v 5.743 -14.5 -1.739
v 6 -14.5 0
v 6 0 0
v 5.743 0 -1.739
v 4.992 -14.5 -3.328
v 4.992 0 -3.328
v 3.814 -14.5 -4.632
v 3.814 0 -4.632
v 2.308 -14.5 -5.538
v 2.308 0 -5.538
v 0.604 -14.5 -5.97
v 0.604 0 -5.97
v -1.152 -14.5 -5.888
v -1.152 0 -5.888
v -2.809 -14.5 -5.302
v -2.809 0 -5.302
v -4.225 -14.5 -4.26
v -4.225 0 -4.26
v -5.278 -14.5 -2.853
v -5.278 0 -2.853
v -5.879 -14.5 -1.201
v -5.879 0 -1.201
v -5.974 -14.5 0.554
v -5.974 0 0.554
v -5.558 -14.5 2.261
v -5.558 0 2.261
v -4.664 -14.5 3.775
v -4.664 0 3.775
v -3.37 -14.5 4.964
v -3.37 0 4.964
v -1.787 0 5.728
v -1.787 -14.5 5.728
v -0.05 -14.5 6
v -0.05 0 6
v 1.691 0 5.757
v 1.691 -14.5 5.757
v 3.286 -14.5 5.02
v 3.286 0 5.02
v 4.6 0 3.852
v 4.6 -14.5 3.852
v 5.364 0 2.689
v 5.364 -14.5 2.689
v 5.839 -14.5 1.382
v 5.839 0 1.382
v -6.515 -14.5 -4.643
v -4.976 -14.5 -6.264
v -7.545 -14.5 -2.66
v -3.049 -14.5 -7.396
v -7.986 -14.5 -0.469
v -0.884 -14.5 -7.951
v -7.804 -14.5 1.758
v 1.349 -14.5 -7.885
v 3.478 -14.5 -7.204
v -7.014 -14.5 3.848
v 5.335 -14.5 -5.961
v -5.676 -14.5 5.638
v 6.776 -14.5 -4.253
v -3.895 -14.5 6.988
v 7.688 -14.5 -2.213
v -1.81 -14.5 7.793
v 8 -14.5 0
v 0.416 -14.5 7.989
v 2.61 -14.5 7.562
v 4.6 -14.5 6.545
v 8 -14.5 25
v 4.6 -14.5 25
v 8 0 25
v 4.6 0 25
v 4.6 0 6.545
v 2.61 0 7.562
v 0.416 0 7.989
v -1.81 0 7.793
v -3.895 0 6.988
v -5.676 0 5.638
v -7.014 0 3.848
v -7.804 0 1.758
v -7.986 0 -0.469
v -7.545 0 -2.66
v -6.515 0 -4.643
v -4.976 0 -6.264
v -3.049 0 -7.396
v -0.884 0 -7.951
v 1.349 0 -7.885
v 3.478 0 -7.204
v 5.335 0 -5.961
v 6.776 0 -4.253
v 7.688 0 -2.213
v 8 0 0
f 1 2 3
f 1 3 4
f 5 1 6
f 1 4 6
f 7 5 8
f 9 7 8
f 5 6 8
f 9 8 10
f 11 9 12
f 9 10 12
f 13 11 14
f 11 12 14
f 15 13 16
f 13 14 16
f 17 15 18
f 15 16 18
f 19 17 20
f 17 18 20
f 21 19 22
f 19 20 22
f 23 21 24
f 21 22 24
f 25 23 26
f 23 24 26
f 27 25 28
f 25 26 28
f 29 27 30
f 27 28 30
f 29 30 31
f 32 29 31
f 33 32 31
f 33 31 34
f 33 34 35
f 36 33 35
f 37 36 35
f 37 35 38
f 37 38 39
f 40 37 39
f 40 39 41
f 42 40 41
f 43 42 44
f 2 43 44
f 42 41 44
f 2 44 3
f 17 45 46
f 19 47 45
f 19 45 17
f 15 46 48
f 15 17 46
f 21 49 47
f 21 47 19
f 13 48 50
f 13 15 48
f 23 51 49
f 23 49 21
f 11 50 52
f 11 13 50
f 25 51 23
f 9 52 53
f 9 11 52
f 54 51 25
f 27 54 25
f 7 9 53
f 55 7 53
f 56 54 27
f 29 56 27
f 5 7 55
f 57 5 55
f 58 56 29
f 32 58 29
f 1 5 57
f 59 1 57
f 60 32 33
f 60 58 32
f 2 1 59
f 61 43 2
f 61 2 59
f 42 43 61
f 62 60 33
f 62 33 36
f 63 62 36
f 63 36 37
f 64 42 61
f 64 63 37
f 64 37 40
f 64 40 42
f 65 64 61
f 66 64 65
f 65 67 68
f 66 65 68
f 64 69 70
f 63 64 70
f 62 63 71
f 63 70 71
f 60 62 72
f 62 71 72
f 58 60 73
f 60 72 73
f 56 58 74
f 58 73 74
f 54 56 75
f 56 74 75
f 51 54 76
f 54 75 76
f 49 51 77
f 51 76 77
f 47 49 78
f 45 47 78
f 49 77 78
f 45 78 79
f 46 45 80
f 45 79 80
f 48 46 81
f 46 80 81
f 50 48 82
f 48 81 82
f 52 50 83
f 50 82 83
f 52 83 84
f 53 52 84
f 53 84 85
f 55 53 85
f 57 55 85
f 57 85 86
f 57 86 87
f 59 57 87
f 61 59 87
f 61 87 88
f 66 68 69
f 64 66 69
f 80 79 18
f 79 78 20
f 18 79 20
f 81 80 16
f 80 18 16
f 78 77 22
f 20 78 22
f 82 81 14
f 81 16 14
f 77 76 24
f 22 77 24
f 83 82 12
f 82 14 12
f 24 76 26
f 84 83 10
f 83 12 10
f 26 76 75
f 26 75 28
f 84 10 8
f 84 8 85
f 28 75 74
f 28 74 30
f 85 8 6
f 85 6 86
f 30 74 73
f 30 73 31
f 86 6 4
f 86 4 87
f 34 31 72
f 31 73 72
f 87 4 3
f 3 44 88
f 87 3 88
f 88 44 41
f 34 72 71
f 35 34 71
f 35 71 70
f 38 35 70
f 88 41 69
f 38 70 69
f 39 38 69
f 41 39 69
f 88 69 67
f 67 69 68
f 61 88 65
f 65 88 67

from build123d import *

# Parameters (mm, degrees)
F1_DEPTH = 14.5


with BuildPart() as f1:
    # F0 (on Front) → F1 (new body)
    with BuildSketch(Plane.XZ):
        with BuildLine():
            ThreePointArc((8, 0), (7.099296, 3.687818), (4.6, 6.545227))
            ThreePointArc((4.6, 6.545227), (-7.099296, -3.687818), (8, 0))
        make_face()
        with BuildLine():
            ThreePointArc((4.6, 3.852272), (5.639149, 2.04939), (6, 0))
            ThreePointArc((6, 0), (-5.639149, -2.04939), (4.6, 3.852272))
        make_face(mode=Mode.SUBTRACT)
        with BuildLine():
            Line((4.6, 25), (4.6, 6.545227))
            ThreePointArc((4.6, 6.545227), (7.099296, 3.687818), (8, 0))
            Line((8, 0), (8, 25))
            Line((8, 25), (4.6, 25))
        make_face()
    extrude(amount=F1_DEPTH)


solid = f1.part
